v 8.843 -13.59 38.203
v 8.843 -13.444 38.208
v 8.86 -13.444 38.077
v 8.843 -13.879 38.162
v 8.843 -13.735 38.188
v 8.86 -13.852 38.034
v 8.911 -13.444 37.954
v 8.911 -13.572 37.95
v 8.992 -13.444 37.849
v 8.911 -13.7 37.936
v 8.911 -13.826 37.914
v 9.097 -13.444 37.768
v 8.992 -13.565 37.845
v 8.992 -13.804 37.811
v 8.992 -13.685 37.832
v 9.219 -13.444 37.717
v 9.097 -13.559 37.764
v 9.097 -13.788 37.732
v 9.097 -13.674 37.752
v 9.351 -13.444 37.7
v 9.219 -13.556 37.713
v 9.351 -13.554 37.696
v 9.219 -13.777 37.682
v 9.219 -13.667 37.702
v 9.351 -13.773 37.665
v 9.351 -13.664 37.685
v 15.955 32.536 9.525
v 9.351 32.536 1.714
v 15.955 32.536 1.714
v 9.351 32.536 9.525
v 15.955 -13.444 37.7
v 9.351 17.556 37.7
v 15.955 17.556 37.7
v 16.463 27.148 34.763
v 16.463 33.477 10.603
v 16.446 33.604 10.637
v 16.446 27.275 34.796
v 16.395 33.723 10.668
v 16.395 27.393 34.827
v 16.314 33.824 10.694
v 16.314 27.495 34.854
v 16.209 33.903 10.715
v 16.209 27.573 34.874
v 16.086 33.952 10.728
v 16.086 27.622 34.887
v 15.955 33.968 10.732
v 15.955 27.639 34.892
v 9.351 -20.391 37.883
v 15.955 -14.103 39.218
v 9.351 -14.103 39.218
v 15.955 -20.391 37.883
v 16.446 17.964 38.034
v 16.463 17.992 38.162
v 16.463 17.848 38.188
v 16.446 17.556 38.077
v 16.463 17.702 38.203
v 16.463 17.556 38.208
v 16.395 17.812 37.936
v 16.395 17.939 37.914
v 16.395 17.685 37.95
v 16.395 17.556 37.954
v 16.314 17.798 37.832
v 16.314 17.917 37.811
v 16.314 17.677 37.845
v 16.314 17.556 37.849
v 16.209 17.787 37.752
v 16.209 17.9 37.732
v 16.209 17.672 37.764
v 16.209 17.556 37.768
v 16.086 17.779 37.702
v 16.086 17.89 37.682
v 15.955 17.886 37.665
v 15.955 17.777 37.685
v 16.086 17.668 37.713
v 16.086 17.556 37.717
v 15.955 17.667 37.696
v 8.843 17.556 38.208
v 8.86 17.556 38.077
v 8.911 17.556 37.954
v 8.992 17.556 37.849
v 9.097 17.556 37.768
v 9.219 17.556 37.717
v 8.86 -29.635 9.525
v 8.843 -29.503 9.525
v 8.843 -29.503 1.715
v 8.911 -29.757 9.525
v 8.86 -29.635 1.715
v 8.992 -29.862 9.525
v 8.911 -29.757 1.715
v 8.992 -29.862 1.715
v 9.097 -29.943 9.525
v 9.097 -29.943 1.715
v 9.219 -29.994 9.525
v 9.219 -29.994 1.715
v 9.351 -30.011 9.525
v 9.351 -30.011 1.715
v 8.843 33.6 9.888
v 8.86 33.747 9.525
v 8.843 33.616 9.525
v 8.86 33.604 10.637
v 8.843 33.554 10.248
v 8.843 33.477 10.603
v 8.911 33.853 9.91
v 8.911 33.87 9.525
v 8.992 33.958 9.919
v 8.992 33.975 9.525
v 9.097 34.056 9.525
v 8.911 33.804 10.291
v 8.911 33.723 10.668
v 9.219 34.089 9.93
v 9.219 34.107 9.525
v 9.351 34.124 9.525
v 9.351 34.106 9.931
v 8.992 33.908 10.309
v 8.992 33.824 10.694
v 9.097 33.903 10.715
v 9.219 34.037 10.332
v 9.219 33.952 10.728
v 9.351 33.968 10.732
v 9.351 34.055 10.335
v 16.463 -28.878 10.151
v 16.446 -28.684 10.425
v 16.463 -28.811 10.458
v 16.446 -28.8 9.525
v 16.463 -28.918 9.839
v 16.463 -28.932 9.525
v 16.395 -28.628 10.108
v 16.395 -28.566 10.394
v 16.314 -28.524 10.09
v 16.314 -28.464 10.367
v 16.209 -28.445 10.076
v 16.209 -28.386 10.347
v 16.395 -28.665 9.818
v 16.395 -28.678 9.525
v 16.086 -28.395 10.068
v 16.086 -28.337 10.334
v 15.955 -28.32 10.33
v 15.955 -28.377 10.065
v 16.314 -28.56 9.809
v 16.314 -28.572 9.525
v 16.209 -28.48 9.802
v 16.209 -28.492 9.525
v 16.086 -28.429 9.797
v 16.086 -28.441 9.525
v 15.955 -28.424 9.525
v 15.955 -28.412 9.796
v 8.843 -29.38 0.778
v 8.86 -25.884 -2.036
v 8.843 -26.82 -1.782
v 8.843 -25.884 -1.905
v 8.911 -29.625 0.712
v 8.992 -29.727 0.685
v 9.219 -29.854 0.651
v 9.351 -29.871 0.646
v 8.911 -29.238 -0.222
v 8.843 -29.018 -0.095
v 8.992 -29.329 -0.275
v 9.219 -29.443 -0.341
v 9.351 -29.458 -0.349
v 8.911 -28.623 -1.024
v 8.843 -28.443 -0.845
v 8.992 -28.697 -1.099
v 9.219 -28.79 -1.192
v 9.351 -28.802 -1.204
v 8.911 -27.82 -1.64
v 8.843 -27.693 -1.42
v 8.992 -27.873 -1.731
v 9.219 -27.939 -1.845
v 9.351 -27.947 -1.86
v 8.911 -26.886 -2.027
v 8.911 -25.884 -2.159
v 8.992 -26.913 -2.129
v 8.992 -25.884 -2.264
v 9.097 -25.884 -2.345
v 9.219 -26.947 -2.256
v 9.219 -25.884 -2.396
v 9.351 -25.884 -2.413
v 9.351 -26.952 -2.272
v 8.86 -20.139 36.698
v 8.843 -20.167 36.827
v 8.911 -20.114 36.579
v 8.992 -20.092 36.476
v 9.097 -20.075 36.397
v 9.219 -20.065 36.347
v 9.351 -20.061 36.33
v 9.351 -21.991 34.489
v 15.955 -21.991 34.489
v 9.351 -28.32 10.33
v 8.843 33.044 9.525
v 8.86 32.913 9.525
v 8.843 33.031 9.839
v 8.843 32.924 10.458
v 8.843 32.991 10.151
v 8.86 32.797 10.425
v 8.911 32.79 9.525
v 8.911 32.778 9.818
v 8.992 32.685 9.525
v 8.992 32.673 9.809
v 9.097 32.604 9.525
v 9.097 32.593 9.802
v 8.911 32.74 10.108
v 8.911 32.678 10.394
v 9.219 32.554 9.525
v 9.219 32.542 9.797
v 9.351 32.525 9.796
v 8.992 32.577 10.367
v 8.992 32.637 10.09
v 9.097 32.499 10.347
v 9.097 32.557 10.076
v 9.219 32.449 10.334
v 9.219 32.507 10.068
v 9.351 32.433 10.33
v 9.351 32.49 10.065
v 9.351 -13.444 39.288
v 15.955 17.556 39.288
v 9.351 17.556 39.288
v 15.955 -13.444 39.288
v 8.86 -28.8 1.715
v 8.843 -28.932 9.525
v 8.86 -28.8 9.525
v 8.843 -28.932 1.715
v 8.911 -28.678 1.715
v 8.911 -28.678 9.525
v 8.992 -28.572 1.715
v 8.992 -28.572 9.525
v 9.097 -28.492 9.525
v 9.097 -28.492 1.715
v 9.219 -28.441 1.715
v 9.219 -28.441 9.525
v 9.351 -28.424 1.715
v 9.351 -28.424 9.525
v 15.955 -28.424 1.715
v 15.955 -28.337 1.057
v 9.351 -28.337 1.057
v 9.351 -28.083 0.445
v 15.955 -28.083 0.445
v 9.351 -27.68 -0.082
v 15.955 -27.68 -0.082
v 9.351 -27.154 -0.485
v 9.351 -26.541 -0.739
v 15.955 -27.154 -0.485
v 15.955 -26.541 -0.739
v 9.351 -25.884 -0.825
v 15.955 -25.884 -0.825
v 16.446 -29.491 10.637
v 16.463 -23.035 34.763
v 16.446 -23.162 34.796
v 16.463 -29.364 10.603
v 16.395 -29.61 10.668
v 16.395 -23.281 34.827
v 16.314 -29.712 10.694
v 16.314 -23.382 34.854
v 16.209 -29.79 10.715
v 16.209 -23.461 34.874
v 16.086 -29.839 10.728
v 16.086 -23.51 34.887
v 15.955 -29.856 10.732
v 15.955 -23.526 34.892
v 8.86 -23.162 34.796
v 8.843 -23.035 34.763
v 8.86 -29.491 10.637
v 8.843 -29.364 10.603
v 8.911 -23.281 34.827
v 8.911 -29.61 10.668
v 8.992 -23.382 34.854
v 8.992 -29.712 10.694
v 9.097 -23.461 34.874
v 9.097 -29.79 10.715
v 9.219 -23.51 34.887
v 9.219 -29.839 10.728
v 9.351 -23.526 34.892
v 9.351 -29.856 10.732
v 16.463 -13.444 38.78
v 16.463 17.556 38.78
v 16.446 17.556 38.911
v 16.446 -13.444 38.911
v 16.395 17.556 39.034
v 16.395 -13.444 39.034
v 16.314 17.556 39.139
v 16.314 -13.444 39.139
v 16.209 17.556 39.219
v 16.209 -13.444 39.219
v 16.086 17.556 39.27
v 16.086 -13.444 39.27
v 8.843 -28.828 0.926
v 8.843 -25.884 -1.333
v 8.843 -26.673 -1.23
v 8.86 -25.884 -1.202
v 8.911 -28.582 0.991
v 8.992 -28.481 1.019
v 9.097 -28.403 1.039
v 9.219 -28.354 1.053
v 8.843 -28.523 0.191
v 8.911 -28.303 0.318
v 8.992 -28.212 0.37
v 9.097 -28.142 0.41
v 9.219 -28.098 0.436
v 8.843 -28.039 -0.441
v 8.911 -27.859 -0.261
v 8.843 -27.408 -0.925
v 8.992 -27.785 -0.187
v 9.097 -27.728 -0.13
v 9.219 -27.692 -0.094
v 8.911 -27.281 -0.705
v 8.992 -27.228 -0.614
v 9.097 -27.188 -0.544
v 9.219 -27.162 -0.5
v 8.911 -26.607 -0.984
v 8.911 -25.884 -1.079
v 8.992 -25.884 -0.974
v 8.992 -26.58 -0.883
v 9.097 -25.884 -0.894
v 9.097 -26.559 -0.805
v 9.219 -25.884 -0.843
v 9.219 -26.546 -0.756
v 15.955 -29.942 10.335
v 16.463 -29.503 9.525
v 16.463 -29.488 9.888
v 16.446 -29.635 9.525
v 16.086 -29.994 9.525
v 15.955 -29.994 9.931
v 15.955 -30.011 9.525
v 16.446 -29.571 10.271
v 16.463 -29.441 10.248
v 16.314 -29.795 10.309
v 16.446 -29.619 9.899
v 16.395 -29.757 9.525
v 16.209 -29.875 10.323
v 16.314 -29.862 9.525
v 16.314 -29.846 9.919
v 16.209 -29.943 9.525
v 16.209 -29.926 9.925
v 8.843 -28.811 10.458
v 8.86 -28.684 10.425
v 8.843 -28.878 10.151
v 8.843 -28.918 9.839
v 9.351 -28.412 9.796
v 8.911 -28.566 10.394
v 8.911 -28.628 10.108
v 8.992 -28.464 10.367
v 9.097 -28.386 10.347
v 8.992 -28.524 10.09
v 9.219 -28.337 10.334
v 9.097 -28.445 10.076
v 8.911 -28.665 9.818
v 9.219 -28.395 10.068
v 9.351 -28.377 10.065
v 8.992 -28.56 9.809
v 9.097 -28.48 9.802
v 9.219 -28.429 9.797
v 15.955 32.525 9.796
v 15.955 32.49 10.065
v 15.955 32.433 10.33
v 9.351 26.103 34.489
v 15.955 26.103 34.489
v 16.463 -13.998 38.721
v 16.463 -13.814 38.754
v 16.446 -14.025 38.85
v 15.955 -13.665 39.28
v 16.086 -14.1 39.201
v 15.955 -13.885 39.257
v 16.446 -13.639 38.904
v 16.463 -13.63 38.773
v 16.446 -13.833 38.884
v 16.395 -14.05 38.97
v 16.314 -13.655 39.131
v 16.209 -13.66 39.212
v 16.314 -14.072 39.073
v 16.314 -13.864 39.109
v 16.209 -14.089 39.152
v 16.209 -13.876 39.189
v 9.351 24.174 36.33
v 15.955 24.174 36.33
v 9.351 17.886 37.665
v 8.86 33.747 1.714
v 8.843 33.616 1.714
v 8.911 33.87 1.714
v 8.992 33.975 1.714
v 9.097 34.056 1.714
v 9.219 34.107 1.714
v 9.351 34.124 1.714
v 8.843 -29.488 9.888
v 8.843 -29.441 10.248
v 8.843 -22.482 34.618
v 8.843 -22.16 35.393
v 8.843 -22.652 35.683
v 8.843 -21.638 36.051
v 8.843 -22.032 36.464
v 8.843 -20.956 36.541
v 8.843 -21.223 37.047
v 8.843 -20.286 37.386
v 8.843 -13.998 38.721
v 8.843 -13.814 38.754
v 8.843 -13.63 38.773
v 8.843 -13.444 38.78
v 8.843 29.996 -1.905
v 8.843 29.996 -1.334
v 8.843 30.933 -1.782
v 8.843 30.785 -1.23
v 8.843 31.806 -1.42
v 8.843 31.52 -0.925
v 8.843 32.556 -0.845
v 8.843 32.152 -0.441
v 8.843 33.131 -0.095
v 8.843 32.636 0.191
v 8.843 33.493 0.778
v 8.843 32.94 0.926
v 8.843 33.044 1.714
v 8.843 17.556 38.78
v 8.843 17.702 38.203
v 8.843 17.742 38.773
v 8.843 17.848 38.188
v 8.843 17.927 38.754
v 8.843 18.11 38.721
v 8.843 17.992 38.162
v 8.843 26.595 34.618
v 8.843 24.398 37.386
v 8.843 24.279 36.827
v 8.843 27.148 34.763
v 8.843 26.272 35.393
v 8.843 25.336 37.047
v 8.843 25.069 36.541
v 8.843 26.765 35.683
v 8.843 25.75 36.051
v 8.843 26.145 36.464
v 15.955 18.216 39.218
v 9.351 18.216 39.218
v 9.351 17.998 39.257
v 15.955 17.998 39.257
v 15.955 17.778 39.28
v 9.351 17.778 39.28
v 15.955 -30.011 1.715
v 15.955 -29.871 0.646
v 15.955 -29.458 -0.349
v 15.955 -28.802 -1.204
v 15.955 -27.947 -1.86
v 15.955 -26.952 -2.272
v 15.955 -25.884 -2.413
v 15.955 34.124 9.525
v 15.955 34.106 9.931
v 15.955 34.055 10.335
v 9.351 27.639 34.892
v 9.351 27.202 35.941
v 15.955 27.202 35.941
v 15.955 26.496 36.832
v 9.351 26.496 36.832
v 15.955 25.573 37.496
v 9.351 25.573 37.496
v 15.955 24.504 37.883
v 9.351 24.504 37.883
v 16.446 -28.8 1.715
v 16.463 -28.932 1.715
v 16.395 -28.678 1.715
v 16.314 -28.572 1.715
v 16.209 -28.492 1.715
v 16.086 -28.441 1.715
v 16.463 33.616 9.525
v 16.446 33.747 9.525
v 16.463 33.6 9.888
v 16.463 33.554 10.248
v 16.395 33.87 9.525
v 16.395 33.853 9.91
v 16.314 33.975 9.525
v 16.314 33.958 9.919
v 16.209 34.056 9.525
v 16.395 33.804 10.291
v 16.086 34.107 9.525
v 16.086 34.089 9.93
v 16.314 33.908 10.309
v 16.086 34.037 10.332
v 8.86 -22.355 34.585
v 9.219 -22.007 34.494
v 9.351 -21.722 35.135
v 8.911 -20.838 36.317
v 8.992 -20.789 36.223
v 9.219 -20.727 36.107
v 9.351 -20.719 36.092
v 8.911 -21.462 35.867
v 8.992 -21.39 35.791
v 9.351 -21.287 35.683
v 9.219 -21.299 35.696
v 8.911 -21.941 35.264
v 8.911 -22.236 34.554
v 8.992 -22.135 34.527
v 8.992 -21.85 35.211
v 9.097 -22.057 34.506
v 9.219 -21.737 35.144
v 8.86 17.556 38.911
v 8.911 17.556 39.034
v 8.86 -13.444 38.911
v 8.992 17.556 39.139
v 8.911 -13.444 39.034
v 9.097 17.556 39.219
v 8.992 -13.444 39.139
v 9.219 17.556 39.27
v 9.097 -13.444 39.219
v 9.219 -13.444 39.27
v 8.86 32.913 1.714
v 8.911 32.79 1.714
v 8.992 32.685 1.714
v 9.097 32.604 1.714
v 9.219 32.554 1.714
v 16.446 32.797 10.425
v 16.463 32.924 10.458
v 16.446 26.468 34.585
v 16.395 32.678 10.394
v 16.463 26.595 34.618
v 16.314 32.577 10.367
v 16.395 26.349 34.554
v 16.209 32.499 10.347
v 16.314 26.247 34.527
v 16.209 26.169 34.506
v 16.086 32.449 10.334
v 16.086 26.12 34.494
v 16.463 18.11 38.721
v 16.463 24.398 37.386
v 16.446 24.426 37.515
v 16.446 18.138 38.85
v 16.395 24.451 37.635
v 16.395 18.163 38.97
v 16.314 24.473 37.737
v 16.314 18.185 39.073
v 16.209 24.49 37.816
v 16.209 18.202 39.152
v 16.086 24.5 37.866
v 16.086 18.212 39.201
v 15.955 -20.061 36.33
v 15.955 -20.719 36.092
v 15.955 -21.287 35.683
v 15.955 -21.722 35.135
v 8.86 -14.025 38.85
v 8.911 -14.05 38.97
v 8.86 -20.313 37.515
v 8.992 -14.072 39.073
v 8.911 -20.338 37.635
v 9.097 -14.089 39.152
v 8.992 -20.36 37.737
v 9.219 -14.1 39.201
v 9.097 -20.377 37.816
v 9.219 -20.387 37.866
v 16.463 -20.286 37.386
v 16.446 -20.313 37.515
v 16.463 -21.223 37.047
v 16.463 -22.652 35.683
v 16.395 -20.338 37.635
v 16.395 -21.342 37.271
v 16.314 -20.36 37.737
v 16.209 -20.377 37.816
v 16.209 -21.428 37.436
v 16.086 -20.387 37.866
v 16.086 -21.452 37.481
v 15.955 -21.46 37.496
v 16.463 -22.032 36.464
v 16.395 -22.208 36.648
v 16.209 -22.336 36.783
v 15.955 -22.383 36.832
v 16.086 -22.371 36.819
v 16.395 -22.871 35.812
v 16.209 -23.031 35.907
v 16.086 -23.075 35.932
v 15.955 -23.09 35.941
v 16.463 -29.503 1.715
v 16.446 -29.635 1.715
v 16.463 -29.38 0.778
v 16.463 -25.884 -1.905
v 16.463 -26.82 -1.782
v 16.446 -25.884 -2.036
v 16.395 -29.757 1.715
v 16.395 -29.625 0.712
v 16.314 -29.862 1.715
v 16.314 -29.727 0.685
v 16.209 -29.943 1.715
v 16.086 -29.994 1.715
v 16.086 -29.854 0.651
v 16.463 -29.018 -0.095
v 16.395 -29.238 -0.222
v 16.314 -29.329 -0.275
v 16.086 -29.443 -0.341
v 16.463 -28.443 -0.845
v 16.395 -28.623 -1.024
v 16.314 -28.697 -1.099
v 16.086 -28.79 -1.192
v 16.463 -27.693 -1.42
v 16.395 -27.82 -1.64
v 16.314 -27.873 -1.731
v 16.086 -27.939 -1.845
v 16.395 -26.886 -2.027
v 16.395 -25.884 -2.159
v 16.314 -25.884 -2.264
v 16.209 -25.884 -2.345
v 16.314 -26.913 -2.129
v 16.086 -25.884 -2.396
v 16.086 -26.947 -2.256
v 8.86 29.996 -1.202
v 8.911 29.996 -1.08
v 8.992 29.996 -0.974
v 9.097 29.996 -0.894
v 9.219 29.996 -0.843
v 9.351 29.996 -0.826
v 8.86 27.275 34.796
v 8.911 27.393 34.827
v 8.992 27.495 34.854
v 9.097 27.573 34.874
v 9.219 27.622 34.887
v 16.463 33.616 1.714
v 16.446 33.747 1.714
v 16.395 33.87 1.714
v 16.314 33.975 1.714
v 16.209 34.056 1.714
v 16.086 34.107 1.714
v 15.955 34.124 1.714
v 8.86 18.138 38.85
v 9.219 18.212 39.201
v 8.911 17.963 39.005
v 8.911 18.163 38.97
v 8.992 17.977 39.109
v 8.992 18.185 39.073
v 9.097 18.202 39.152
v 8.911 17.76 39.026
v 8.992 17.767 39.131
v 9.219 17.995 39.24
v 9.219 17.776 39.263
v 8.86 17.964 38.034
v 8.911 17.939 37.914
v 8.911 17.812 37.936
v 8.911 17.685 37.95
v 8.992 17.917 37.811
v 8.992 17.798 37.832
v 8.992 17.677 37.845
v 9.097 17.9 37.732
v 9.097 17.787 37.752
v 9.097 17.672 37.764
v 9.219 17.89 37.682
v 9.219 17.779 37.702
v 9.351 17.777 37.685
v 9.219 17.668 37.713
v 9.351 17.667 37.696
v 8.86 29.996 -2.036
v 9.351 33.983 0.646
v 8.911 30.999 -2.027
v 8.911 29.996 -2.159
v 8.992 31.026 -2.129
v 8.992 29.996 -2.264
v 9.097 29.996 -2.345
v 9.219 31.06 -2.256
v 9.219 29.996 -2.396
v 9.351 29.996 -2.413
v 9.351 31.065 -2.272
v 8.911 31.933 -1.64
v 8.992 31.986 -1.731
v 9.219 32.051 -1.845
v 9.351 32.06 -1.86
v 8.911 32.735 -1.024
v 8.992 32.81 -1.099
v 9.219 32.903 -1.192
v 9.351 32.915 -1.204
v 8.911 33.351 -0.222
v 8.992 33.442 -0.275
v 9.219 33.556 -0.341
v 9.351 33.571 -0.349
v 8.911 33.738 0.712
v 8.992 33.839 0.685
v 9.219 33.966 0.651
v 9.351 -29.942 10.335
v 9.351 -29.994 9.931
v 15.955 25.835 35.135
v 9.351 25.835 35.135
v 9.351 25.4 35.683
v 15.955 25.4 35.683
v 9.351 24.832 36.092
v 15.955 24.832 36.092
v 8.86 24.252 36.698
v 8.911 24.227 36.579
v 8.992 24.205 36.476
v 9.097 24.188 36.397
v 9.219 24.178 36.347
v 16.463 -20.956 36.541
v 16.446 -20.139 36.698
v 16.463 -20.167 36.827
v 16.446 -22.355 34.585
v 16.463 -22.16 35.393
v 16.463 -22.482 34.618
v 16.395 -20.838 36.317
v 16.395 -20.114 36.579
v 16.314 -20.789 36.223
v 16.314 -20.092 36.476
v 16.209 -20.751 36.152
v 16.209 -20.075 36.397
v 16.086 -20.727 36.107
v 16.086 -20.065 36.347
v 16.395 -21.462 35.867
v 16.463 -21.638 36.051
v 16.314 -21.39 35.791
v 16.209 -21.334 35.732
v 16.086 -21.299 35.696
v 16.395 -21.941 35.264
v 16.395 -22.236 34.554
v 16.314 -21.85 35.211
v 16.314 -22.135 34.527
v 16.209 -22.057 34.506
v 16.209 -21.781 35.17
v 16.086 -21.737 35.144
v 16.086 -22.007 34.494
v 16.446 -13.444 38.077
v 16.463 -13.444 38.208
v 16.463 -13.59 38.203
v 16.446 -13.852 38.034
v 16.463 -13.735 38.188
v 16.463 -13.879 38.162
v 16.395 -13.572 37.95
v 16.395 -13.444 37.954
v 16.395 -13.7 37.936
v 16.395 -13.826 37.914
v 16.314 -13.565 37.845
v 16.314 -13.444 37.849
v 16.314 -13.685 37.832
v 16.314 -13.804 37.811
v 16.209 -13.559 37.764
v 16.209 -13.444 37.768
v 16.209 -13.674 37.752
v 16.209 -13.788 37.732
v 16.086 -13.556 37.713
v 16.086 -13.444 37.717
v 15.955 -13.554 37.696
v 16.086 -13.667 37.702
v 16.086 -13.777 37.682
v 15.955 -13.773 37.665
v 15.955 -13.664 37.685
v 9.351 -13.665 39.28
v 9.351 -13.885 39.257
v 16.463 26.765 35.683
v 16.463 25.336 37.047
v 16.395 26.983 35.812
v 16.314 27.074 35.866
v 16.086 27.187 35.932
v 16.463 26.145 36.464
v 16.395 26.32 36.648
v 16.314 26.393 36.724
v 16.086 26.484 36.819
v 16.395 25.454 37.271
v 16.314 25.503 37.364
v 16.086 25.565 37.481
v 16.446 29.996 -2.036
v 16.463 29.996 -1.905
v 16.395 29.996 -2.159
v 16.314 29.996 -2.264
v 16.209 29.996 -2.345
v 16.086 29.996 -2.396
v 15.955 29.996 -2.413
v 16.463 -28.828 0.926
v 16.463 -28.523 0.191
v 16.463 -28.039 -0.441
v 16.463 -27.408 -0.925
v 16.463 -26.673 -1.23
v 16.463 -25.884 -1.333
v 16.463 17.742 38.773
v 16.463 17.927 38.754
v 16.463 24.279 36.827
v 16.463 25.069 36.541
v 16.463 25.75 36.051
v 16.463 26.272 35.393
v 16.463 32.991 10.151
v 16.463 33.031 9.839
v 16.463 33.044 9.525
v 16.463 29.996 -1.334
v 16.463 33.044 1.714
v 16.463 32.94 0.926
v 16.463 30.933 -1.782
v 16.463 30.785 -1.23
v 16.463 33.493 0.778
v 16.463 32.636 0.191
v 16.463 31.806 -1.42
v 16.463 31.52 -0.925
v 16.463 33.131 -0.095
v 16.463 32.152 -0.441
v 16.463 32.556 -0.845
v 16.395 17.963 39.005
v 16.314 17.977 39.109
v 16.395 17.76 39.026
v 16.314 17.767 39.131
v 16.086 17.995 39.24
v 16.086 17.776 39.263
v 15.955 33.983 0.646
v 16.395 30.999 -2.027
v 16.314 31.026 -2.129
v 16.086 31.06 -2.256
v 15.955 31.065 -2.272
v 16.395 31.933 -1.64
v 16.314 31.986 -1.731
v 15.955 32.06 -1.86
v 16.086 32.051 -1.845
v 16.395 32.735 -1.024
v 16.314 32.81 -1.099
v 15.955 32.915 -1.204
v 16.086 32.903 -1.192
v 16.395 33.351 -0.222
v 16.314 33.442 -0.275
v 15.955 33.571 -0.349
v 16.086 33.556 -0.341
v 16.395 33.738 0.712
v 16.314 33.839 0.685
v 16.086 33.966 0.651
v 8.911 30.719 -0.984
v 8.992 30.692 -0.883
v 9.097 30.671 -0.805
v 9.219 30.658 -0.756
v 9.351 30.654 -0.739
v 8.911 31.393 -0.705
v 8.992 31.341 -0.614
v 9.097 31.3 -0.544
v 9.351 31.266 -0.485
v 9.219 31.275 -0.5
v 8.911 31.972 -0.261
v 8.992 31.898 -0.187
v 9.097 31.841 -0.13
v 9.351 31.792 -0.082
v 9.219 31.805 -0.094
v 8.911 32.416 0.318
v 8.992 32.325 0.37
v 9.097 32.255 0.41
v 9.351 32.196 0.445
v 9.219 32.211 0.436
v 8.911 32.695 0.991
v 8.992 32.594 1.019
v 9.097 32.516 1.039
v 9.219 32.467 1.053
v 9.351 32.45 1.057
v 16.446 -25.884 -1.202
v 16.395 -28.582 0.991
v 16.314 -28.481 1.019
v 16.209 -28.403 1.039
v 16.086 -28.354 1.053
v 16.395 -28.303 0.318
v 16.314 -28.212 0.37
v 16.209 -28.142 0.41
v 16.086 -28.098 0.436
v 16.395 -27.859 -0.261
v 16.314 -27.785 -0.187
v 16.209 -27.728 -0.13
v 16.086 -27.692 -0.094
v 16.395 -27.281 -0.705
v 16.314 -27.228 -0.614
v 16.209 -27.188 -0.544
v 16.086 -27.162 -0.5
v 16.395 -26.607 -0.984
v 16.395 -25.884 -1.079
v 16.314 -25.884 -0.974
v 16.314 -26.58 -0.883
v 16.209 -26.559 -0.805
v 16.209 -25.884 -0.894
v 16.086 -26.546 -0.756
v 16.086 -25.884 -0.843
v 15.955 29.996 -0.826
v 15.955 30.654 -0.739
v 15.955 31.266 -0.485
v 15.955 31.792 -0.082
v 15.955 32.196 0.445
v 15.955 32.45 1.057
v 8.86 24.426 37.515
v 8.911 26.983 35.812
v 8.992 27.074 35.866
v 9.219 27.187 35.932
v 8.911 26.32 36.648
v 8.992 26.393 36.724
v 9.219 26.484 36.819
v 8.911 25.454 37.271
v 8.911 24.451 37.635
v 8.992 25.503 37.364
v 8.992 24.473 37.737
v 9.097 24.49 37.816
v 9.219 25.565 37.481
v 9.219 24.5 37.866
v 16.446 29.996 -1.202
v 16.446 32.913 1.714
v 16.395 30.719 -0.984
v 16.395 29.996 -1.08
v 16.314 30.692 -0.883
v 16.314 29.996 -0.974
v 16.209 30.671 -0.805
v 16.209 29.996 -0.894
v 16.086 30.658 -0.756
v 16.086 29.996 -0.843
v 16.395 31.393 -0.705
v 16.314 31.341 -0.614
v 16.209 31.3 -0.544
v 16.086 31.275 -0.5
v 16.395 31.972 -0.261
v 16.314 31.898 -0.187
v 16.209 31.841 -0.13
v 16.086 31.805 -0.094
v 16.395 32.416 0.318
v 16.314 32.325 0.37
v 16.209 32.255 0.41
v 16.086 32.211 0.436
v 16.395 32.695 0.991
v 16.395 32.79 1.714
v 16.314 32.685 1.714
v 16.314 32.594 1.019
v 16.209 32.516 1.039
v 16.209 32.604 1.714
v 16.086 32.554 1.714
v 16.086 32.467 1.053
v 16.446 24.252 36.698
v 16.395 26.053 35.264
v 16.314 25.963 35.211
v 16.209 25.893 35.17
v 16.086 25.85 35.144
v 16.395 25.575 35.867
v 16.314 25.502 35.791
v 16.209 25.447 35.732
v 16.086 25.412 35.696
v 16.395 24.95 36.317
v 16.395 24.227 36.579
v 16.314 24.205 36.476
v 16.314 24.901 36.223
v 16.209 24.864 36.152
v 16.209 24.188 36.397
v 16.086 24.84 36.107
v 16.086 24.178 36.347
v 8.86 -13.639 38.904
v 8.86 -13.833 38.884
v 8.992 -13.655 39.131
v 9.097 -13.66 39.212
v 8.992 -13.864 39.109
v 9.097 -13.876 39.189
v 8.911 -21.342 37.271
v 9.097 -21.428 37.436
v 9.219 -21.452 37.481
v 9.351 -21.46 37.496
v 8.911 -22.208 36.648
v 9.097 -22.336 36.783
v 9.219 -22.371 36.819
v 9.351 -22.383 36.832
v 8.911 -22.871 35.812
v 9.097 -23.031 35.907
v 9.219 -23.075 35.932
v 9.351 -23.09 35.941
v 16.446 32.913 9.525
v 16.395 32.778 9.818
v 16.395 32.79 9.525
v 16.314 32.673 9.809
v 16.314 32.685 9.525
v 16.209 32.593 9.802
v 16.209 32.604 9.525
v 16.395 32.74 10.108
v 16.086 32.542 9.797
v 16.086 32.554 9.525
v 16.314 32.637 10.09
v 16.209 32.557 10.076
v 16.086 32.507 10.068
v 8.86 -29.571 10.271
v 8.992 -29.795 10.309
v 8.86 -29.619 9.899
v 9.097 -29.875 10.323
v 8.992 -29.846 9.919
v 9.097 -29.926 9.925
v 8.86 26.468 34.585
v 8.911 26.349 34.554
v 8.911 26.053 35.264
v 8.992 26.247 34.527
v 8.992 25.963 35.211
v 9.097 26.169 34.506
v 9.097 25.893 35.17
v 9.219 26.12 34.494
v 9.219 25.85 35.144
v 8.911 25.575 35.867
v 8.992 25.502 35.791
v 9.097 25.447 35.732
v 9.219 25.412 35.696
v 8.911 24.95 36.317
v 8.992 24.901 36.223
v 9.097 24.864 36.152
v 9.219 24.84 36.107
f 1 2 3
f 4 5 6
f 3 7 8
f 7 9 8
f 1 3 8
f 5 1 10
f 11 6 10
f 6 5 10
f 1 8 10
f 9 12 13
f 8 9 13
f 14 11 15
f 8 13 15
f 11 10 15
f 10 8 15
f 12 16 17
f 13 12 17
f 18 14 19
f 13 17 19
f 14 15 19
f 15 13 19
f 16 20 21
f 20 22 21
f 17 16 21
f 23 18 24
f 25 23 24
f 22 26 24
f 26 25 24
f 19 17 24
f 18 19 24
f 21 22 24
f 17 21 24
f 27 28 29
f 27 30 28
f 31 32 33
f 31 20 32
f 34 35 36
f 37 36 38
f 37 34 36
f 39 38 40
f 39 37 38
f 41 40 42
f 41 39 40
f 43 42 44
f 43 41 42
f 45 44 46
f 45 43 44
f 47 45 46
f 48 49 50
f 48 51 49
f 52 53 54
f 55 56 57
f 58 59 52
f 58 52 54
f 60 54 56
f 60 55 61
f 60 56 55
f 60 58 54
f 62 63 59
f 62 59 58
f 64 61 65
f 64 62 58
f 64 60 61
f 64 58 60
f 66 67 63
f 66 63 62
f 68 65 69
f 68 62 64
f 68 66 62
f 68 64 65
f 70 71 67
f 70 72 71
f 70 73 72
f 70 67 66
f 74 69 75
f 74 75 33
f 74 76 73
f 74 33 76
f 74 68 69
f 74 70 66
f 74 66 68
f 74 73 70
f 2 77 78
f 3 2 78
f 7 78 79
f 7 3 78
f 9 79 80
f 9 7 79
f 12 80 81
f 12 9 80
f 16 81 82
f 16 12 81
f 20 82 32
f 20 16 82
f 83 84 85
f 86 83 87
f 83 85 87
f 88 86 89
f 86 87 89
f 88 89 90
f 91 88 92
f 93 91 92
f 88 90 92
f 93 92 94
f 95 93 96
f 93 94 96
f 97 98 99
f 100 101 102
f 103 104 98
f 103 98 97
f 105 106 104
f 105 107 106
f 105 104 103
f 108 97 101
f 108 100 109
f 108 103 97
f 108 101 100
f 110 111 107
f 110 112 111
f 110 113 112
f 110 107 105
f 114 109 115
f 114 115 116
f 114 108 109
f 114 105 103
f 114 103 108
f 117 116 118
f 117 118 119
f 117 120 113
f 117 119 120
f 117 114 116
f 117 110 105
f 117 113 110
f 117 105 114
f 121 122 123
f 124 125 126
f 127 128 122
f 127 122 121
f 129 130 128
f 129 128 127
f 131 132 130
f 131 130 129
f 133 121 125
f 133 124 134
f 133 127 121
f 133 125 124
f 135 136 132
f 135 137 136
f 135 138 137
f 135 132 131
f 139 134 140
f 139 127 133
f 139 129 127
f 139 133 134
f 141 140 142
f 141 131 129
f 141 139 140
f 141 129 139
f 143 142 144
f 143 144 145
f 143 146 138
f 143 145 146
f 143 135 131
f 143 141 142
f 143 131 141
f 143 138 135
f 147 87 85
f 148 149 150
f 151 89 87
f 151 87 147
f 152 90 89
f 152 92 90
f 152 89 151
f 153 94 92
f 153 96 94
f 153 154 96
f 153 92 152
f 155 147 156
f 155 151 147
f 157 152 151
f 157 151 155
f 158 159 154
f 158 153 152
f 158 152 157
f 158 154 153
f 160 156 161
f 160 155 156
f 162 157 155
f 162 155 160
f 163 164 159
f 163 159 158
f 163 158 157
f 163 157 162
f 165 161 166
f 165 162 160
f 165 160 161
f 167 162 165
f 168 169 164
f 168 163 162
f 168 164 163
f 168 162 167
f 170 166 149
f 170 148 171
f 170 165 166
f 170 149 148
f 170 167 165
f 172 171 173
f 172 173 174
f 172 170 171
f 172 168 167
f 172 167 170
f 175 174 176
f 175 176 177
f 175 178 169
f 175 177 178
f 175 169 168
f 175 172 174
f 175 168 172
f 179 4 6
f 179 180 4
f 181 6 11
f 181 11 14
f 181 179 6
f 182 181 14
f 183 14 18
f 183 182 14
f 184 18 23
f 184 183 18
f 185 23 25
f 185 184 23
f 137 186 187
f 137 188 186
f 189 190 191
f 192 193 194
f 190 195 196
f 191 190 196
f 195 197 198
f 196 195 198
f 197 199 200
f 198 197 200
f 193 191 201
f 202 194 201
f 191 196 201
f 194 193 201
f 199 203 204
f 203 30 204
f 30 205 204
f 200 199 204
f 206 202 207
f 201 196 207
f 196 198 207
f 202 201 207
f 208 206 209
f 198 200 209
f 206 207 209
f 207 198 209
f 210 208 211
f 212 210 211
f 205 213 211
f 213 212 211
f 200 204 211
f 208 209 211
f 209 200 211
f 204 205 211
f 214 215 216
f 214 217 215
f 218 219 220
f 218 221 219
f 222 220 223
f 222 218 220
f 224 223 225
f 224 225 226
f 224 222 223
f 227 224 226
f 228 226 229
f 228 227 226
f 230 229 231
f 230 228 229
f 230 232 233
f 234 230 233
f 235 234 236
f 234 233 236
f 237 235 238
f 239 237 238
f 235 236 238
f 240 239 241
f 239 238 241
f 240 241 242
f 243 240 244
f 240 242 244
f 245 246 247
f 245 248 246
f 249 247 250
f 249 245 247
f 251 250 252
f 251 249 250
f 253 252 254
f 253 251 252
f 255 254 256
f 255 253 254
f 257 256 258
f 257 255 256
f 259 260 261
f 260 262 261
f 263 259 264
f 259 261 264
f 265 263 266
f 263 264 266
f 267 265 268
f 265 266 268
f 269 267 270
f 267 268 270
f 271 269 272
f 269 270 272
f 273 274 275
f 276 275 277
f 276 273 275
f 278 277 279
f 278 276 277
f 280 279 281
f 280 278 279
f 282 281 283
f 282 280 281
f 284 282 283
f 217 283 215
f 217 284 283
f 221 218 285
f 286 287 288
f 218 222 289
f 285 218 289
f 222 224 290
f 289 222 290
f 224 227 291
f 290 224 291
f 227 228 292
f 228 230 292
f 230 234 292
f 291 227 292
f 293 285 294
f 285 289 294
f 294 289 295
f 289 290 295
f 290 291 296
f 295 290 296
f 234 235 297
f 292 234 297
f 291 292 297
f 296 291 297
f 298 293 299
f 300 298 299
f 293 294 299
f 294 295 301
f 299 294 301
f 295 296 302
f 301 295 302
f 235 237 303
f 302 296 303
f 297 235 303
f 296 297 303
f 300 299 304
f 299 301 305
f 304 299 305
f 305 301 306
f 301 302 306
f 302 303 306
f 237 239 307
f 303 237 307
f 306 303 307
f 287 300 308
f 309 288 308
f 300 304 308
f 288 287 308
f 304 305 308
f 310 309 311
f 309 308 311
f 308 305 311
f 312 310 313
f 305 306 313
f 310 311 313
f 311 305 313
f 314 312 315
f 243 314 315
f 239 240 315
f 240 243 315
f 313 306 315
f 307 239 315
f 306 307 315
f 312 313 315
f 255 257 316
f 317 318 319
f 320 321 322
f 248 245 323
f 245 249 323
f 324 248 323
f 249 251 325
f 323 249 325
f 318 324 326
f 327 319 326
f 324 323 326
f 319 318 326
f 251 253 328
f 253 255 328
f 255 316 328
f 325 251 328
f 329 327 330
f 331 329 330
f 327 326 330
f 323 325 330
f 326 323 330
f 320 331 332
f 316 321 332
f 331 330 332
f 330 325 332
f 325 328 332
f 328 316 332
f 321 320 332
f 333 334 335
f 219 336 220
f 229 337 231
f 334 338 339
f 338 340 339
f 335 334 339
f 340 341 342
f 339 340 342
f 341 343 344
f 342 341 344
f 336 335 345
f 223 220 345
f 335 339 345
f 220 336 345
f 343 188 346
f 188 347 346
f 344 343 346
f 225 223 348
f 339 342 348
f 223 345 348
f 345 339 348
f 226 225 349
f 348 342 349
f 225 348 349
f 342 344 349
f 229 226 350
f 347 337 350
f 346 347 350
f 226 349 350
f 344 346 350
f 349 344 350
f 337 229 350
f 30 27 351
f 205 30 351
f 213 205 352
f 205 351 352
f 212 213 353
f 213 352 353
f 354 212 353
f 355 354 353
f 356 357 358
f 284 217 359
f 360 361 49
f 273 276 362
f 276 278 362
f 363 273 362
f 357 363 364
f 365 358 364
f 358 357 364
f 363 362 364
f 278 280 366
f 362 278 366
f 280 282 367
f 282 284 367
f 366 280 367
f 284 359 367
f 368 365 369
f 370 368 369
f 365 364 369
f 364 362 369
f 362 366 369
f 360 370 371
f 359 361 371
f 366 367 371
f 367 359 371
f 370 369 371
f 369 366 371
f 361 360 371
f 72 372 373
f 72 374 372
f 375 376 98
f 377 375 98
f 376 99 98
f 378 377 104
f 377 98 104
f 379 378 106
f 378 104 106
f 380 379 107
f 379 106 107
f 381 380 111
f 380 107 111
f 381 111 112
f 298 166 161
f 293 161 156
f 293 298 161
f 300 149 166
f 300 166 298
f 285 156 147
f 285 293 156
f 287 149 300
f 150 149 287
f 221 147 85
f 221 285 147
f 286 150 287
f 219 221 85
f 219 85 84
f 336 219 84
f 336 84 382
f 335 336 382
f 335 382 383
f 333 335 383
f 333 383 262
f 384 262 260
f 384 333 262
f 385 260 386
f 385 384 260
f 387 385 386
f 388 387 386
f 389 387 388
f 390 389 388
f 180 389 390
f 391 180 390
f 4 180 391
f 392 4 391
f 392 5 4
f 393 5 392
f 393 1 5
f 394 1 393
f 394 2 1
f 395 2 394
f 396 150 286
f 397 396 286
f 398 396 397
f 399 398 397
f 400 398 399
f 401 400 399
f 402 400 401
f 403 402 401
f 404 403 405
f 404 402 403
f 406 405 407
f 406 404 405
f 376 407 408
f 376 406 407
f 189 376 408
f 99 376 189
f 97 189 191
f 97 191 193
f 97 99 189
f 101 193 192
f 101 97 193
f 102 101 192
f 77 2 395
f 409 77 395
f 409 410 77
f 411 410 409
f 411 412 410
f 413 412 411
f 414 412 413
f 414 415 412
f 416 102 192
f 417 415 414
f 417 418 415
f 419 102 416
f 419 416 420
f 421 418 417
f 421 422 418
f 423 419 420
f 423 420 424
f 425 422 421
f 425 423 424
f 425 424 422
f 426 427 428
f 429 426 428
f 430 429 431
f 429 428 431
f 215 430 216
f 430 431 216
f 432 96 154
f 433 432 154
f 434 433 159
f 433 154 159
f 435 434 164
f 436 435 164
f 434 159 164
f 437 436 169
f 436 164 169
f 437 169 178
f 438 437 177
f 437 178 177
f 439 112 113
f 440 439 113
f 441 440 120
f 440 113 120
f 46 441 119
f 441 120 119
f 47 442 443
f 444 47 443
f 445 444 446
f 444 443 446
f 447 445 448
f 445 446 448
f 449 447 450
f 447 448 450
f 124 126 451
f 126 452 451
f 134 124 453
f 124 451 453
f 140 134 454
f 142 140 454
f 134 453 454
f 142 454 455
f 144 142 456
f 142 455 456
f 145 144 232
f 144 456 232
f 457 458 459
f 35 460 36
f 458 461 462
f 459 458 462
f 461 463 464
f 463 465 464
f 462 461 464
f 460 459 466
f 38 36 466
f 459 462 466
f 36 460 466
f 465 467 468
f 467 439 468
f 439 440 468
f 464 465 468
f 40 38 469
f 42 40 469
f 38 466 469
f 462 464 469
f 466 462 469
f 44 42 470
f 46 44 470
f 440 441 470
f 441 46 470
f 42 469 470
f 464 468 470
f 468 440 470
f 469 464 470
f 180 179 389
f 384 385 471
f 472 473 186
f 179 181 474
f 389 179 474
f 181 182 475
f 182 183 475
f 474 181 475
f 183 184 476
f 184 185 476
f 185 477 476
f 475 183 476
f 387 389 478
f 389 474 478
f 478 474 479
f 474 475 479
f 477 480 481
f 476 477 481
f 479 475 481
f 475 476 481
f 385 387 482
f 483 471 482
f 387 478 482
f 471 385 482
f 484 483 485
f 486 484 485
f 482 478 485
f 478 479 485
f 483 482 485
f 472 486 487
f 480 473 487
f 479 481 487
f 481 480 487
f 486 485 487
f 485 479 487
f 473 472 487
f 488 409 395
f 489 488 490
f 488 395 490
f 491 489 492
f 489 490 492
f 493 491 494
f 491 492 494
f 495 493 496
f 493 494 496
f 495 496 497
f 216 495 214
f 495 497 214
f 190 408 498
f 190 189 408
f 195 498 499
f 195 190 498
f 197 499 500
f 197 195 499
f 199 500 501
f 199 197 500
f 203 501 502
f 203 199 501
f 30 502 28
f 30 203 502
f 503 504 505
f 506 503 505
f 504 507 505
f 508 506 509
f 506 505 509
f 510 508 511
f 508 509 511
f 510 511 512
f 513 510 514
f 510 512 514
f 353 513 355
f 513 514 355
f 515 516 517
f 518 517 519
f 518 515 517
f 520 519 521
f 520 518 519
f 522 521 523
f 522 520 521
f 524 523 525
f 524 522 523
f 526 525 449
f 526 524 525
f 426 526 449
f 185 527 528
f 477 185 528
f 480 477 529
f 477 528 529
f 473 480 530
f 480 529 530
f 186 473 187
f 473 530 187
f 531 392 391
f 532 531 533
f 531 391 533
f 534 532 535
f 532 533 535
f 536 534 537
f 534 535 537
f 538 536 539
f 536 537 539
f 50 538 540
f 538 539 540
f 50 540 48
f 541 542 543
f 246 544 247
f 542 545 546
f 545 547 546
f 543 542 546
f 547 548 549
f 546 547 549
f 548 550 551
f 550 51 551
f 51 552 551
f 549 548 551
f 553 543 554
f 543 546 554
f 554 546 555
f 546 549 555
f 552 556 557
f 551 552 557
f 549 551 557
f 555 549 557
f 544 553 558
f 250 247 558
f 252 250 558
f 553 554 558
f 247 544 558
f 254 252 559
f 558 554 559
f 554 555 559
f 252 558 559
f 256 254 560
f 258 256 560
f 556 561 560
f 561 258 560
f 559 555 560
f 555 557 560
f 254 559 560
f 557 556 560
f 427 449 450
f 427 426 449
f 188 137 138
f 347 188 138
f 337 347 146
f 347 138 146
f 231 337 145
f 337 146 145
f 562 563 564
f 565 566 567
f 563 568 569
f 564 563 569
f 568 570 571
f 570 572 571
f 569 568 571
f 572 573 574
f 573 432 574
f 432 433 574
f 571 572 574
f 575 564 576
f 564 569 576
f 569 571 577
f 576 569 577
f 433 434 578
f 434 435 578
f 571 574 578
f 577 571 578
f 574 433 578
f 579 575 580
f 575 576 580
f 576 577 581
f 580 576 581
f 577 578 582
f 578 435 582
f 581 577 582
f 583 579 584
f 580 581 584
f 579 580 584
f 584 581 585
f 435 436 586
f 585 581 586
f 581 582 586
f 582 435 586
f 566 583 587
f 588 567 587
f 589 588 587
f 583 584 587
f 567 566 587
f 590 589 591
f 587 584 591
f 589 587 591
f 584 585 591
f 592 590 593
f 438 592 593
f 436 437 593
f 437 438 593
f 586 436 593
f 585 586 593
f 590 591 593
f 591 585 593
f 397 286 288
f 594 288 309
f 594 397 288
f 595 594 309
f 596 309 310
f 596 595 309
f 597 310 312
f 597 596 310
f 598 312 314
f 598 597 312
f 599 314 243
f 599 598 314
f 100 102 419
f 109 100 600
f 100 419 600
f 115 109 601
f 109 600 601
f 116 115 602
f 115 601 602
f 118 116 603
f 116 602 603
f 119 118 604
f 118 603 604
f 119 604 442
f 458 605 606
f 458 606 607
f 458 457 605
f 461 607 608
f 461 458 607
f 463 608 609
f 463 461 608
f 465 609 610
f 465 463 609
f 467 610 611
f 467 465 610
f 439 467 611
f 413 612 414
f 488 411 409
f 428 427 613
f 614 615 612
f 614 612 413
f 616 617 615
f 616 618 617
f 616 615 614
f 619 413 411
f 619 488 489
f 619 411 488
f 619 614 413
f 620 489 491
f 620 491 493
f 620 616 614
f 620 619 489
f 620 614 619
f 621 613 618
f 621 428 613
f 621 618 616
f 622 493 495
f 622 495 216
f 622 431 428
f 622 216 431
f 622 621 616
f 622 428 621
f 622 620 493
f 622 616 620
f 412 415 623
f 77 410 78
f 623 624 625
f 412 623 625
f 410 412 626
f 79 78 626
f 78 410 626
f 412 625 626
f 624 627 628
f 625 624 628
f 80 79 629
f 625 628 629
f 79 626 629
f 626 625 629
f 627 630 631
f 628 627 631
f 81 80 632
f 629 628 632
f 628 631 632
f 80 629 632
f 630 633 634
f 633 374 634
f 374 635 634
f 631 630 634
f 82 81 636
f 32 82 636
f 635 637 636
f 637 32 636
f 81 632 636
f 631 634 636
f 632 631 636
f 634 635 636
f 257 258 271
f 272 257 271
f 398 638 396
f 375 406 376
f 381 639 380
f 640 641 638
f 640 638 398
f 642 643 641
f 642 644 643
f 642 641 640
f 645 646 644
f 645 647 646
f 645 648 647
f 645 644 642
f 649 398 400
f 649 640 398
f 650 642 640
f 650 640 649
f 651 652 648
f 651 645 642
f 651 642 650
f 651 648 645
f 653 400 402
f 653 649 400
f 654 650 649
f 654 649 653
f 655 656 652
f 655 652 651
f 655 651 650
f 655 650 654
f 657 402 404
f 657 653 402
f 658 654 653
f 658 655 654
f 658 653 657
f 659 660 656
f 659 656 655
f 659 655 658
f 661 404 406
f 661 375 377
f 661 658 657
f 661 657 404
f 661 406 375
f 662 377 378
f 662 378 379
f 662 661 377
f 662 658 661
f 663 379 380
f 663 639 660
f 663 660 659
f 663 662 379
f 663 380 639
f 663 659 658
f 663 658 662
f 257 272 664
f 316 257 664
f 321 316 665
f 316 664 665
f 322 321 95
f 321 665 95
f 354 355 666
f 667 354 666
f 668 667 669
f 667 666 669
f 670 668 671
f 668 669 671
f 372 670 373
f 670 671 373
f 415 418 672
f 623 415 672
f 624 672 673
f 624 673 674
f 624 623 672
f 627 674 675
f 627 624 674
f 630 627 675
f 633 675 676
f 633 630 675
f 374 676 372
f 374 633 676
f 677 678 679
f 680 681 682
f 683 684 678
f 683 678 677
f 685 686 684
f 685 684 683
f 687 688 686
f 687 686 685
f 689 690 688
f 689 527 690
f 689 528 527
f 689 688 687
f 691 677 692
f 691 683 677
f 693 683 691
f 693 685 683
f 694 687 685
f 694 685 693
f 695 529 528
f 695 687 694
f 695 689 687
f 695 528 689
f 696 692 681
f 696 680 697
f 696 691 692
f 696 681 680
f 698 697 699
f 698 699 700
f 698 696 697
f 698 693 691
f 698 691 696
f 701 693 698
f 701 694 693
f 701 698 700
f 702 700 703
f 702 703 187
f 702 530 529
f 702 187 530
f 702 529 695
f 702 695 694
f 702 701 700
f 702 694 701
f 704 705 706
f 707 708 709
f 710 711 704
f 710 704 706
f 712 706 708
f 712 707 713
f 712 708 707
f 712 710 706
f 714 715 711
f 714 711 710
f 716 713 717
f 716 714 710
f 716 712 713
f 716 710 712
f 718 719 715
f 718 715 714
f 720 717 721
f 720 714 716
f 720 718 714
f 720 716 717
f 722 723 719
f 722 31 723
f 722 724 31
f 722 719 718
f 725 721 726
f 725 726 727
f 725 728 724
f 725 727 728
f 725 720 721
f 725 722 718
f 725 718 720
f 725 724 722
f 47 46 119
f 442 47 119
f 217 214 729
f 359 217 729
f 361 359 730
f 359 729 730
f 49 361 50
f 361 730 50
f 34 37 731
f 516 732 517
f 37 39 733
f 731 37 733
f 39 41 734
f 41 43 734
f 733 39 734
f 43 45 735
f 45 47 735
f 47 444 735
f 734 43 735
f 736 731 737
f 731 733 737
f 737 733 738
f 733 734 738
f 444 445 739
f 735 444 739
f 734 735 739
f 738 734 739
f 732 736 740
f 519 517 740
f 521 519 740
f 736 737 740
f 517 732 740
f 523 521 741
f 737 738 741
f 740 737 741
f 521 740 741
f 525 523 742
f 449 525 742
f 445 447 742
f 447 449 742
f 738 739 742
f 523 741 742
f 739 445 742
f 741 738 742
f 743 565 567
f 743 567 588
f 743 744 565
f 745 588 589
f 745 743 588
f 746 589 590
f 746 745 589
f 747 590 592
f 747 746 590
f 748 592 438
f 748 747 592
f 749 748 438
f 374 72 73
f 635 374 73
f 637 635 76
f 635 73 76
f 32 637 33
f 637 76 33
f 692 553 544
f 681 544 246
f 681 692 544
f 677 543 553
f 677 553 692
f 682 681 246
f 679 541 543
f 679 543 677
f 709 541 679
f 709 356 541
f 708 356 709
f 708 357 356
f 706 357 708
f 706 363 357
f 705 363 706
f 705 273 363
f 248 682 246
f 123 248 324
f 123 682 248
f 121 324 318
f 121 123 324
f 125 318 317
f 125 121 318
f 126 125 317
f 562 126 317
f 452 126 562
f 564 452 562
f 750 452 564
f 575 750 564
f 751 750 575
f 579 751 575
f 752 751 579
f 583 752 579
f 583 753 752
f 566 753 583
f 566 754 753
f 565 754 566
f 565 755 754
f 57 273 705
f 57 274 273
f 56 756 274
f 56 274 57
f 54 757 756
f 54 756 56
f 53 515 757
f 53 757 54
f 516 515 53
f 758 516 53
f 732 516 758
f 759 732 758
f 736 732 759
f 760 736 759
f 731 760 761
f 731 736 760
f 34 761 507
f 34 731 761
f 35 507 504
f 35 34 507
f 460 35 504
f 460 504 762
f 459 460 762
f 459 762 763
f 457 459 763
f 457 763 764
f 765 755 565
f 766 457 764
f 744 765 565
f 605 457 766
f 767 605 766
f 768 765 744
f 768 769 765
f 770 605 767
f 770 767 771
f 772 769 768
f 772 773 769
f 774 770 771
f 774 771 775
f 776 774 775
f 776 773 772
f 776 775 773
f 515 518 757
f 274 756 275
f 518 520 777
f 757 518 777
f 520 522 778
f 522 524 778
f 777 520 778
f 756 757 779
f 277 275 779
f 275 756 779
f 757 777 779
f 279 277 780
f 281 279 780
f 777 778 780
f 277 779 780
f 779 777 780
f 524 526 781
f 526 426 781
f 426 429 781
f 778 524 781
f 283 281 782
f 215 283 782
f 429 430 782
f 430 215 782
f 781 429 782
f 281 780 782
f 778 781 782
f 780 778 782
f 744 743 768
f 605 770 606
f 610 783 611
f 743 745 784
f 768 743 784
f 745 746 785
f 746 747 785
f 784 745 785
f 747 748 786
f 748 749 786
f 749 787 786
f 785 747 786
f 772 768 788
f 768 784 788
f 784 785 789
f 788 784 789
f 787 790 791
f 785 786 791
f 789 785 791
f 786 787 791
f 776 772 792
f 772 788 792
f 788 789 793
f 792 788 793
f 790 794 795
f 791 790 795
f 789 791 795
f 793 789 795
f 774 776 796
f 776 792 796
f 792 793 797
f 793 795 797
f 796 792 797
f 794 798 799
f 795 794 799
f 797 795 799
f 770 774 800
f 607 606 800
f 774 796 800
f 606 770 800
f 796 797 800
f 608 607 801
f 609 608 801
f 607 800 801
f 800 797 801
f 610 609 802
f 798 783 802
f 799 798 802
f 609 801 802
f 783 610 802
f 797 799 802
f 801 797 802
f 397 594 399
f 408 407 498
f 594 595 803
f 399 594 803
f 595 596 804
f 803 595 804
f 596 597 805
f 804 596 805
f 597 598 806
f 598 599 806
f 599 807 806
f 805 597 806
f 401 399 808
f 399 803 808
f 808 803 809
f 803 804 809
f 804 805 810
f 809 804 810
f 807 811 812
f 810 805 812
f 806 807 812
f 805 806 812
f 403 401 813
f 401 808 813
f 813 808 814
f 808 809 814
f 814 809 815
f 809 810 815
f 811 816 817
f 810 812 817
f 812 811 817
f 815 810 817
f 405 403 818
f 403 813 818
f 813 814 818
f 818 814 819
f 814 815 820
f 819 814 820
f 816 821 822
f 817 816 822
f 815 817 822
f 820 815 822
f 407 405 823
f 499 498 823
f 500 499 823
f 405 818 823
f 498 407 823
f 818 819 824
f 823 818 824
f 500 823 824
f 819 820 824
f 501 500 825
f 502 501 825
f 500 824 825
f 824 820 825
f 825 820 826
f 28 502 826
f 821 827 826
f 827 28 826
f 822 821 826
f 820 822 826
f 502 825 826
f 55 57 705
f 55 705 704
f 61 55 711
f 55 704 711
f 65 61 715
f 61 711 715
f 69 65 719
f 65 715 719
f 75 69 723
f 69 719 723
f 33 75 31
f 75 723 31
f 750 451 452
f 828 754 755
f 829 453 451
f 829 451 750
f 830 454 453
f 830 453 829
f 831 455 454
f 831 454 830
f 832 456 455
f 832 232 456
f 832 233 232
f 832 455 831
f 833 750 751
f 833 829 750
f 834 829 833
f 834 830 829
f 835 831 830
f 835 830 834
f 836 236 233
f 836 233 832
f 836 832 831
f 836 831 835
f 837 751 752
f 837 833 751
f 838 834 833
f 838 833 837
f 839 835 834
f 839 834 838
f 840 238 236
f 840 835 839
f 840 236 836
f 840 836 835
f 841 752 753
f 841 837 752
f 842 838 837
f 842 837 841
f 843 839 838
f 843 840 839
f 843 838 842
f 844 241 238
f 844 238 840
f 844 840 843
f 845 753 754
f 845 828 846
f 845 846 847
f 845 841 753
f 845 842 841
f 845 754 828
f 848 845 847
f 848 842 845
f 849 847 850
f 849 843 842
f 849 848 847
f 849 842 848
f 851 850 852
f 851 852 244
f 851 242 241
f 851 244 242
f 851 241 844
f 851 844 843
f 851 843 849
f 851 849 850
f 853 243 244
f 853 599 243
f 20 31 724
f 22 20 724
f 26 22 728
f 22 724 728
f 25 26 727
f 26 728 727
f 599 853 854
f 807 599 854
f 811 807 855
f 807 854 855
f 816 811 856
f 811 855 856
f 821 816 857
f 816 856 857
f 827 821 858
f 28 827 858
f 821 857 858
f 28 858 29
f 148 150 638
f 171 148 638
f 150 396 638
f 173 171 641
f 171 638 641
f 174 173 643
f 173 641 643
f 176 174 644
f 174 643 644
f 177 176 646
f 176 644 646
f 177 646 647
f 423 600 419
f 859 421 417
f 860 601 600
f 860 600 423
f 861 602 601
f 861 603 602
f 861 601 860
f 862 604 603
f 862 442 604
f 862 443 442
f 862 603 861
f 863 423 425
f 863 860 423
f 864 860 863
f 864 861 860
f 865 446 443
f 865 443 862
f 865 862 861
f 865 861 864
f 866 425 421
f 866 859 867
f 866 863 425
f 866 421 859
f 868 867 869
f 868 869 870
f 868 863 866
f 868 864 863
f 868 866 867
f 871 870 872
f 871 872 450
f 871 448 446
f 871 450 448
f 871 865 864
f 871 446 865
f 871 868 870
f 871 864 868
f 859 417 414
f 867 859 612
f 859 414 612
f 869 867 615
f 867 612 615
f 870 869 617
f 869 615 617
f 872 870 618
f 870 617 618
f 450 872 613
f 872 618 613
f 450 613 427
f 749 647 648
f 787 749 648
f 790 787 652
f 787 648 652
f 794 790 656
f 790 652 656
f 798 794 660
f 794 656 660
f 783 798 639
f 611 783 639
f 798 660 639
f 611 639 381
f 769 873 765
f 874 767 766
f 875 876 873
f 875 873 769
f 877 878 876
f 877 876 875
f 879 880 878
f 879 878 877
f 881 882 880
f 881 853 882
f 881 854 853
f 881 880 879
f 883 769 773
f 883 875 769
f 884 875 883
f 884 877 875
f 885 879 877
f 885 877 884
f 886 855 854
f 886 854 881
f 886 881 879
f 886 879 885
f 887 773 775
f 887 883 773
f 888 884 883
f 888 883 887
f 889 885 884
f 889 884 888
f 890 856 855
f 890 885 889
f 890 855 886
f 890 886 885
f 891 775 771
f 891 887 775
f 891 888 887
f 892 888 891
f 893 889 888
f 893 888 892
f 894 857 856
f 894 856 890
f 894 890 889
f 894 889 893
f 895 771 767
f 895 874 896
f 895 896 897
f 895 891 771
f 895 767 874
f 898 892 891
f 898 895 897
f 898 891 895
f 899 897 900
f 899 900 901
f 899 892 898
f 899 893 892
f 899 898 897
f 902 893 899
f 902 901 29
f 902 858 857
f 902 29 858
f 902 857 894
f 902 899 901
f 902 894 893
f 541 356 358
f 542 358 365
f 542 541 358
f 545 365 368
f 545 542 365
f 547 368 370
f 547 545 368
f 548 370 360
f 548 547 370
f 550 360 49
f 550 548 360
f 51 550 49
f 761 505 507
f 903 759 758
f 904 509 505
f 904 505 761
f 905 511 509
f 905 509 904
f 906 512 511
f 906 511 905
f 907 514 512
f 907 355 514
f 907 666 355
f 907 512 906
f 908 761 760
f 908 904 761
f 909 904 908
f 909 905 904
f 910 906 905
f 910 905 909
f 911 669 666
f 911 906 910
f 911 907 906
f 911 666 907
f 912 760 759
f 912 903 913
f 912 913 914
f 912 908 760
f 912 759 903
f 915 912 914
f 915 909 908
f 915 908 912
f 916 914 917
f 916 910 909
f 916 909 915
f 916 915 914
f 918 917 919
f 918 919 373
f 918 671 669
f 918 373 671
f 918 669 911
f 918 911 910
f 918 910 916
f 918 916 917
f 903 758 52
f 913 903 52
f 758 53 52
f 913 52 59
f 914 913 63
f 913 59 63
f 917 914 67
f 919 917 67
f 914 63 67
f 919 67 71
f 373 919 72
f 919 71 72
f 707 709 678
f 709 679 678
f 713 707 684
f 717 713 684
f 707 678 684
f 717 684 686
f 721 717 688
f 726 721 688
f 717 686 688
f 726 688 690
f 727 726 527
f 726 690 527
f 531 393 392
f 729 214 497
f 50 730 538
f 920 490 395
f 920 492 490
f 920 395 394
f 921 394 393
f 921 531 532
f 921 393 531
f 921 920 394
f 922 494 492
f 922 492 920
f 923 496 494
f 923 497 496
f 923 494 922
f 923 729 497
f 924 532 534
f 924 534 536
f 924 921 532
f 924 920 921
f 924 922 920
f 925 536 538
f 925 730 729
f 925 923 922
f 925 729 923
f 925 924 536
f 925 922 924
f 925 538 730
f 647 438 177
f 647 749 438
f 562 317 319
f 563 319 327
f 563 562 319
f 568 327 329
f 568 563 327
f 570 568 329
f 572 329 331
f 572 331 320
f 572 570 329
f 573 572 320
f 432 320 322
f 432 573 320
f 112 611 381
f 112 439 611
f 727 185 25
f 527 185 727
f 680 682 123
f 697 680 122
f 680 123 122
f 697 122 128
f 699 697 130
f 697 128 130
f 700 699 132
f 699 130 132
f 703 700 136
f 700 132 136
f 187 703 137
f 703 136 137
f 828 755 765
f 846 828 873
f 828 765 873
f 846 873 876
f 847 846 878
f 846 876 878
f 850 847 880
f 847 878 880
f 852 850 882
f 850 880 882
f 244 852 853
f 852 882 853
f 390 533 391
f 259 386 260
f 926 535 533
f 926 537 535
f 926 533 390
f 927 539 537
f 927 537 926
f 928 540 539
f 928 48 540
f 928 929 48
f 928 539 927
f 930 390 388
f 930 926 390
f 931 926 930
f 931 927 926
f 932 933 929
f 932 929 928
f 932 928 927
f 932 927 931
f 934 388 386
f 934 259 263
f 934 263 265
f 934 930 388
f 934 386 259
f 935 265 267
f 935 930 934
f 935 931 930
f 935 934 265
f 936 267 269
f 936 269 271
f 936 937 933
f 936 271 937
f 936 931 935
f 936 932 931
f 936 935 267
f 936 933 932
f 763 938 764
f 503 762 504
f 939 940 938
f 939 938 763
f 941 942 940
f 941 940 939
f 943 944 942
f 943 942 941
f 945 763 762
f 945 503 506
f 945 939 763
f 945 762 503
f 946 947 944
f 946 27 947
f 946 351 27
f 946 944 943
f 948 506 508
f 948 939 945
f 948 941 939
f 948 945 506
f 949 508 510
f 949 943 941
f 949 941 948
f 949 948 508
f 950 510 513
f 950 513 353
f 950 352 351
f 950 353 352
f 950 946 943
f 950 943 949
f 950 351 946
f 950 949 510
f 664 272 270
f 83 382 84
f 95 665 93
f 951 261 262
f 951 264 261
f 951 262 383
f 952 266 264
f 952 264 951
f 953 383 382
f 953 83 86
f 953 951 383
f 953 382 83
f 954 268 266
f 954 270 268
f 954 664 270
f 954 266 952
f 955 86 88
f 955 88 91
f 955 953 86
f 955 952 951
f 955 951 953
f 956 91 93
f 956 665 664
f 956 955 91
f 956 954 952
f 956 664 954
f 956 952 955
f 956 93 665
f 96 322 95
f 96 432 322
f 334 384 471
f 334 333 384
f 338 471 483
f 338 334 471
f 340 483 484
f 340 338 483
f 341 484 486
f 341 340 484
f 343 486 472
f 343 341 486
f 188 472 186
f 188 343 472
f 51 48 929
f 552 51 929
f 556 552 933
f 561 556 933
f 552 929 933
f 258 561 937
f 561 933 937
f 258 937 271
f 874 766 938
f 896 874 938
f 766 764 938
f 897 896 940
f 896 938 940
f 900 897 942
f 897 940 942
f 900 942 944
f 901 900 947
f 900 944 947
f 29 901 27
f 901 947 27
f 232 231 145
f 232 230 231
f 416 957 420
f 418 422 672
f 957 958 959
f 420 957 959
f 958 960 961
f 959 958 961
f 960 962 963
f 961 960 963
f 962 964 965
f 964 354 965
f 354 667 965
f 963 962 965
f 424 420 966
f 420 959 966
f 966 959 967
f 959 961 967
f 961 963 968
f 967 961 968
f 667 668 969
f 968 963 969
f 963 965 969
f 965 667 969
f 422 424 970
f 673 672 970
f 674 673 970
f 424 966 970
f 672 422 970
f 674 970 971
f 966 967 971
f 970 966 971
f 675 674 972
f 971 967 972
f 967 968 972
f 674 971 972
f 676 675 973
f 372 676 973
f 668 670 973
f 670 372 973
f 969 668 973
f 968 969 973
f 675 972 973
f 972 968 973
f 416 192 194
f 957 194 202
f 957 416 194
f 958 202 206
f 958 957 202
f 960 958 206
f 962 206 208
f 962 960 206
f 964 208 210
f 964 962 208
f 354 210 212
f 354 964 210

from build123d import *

# Parameters (mm, degrees)
SKETCH3_W = 7.62
SKETCH3_H = 1.5875
FILLET1_R = 0.508


with BuildPart() as part:
    # Sweep1: sweep along a path in Sketch2
    with BuildLine(Plane(origin=(12.652967073, 0, 0), x_dir=(0, 0, -1), z_dir=(1, 0, 0))) as sweep1_path:
        Line((0.8255, -25.883657999), (0.8255, 29.996342001))
        ThreePointArc((0.8255, 29.996342001), (0.081551224, 31.792393225), (-1.7145, 32.536342001))
        Line((-1.7145, 32.536342001), (-9.525, 32.536342001))
        ThreePointArc((-9.525, 32.536342001), (-9.930637017, 32.510323362), (-10.329625768, 32.432693881))
        Line((-10.329625768, 32.432693881), (-34.489200615, 26.103423505))
        ThreePointArc((-34.489200615, 26.103423505), (-35.683232492, 25.399721391), (-36.330095218, 24.173965541))
        Line((-36.330095218, 24.173965541), (-37.665372012, 17.886106714))
        ThreePointArc((-37.665372012, 17.886106714), (-37.691319269, 17.72213092), (-37.7, 17.556342001))
        Line((-37.7, 17.556342001), (-37.7, -13.443657999))
        ThreePointArc((-37.7, -13.443657999), (-37.691319269, -13.609446919), (-37.665372012, -13.773422712))
        Line((-37.665372012, -13.773422712), (-36.330095218, -20.061281539))
        ThreePointArc((-36.330095218, -20.061281539), (-35.683232492, -21.287037389), (-34.489200615, -21.990739503))
        Line((-34.489200615, -21.990739503), (-10.329625768, -28.320009879))
        ThreePointArc((-10.329625768, -28.320009879), (-9.930637017, -28.39763936), (-9.525, -28.423657999))
        Line((-9.525, -28.423657999), (-1.7145, -28.423657999))
        ThreePointArc((-1.7145, -28.423657999), (0.081551224, -27.679709223), (0.8255, -25.883657999))
    # Sketch3 → Sweep1 (sweep)
    with BuildSketch(Plane(origin=(0, 0, 0), x_dir=(1, 0, 0), z_dir=(0, 1, 0))):
        with Locations((12.652967073, 1.61925)):
            Rectangle(SKETCH3_W, SKETCH3_H)
    sweep(path=sweep1_path.line)

    # Fillet1
    fillet1_edges = [part.edges().sort_by_distance(p)[0] for p in [
        (16.462967073, -26.691050632, 22.811726076),
        (8.842967073, -26.691050632, 22.811726076),
        (8.842967073, -25.155374691, 22.409413191),
        (16.462967073, -21.287037389, 35.683232492),
        (16.462967073, -22.382899508, 36.8318153),
        (8.842967073, -22.382899508, 36.8318153),
        (8.842967073, -21.287037389, 35.683232492),
        (16.462967073, -16.917352126, 36.997733615),
        (16.462967073, -17.247116838, 38.550605627),
        (8.842967073, -17.247116838, 38.550605627),
        (8.842967073, -16.917352126, 36.997733615),
        (16.462967073, -13.609446919, 37.691319269),
        (16.462967073, -13.775235838, 39.270138538),
        (8.842967073, -13.775235838, 39.270138538),
        (16.462967073, 2.056342001, -0.8255),
        (8.842967073, -13.609446919, 37.691319269),
        (16.462967073, 2.056342001, 37.7),
        (16.462967073, 2.056342001, 39.2875),
        (8.842967073, 2.056342001, 39.2875),
        (8.842967073, 2.056342001, 37.7),
        (16.462967073, 2.056342001, -2.413),
        (16.462967073, 17.72213092, 37.691319269),
        (16.462967073, 17.88791984, 39.270138538),
        (8.842967073, 17.88791984, 39.270138538),
        (8.842967073, 17.72213092, 37.691319269),
        (16.462967073, 21.030036127, 36.997733615),
        (16.462967073, 21.35980084, 38.550605627),
        (8.842967073, 21.35980084, 38.550605627),
        (8.842967073, 2.056342001, -2.413),
        (8.842967073, 21.030036127, 36.997733615),
        (16.462967073, 25.399721391, 35.683232492),
        (16.462967073, 26.49558351, 36.8318153),
        (8.842967073, 26.49558351, 36.8318153),
        (8.842967073, 25.399721391, 35.683232492),
        (16.462967073, 29.268058693, 22.409413191),
        (16.462967073, 30.803734633, 22.811726076),
        (8.842967073, 30.803734633, 22.811726076),
        (8.842967073, 29.268058693, 22.409413191),
        (16.462967073, 32.510323362, 9.930637017),
        (8.842967073, 2.056342001, -0.8255),
        (16.462967073, 34.084814042, 10.133455526),
        (8.842967073, 34.084814042, 10.133455526),
        (8.842967073, 32.510323362, 9.930637017),
        (16.462967073, 32.536342001, 5.61975),
        (16.462967073, 34.123842001, 5.61975),
        (8.842967073, 34.123842001, 5.61975),
        (8.842967073, 32.536342001, 5.61975),
        (16.462967073, 31.792393225, -0.081551224),
        (16.462967073, 32.91492524, -1.204083239),
        (8.842967073, 32.91492524, -1.204083239),
        (8.842967073, 31.792393225, -0.081551224),
        (16.462967073, 2.056342001, -0.8255),
        (16.462967073, 2.056342001, -2.413),
        (8.842967073, 2.056342001, -2.413),
        (8.842967073, 2.056342001, -0.8255),
        (16.462967073, -27.679709223, -0.081551224),
        (16.462967073, -28.802241238, -1.204083239),
        (8.842967073, -28.802241238, -1.204083239),
        (8.842967073, -27.679709223, -0.081551224),
        (16.462967073, -28.423657999, 5.61975),
        (16.462967073, -30.011157999, 5.61975),
        (8.842967073, -30.011157999, 5.61975),
        (8.842967073, -28.423657999, 5.61975),
        (16.462967073, -28.39763936, 9.930637017),
        (16.462967073, -29.97213004, 10.133455526),
        (8.842967073, -29.97213004, 10.133455526),
        (8.842967073, -28.39763936, 9.930637017),
        (16.462967073, -25.155374691, 22.409413191),
    ]]
    fillet(fillet1_edges, radius=FILLET1_R)


solid = part.part
